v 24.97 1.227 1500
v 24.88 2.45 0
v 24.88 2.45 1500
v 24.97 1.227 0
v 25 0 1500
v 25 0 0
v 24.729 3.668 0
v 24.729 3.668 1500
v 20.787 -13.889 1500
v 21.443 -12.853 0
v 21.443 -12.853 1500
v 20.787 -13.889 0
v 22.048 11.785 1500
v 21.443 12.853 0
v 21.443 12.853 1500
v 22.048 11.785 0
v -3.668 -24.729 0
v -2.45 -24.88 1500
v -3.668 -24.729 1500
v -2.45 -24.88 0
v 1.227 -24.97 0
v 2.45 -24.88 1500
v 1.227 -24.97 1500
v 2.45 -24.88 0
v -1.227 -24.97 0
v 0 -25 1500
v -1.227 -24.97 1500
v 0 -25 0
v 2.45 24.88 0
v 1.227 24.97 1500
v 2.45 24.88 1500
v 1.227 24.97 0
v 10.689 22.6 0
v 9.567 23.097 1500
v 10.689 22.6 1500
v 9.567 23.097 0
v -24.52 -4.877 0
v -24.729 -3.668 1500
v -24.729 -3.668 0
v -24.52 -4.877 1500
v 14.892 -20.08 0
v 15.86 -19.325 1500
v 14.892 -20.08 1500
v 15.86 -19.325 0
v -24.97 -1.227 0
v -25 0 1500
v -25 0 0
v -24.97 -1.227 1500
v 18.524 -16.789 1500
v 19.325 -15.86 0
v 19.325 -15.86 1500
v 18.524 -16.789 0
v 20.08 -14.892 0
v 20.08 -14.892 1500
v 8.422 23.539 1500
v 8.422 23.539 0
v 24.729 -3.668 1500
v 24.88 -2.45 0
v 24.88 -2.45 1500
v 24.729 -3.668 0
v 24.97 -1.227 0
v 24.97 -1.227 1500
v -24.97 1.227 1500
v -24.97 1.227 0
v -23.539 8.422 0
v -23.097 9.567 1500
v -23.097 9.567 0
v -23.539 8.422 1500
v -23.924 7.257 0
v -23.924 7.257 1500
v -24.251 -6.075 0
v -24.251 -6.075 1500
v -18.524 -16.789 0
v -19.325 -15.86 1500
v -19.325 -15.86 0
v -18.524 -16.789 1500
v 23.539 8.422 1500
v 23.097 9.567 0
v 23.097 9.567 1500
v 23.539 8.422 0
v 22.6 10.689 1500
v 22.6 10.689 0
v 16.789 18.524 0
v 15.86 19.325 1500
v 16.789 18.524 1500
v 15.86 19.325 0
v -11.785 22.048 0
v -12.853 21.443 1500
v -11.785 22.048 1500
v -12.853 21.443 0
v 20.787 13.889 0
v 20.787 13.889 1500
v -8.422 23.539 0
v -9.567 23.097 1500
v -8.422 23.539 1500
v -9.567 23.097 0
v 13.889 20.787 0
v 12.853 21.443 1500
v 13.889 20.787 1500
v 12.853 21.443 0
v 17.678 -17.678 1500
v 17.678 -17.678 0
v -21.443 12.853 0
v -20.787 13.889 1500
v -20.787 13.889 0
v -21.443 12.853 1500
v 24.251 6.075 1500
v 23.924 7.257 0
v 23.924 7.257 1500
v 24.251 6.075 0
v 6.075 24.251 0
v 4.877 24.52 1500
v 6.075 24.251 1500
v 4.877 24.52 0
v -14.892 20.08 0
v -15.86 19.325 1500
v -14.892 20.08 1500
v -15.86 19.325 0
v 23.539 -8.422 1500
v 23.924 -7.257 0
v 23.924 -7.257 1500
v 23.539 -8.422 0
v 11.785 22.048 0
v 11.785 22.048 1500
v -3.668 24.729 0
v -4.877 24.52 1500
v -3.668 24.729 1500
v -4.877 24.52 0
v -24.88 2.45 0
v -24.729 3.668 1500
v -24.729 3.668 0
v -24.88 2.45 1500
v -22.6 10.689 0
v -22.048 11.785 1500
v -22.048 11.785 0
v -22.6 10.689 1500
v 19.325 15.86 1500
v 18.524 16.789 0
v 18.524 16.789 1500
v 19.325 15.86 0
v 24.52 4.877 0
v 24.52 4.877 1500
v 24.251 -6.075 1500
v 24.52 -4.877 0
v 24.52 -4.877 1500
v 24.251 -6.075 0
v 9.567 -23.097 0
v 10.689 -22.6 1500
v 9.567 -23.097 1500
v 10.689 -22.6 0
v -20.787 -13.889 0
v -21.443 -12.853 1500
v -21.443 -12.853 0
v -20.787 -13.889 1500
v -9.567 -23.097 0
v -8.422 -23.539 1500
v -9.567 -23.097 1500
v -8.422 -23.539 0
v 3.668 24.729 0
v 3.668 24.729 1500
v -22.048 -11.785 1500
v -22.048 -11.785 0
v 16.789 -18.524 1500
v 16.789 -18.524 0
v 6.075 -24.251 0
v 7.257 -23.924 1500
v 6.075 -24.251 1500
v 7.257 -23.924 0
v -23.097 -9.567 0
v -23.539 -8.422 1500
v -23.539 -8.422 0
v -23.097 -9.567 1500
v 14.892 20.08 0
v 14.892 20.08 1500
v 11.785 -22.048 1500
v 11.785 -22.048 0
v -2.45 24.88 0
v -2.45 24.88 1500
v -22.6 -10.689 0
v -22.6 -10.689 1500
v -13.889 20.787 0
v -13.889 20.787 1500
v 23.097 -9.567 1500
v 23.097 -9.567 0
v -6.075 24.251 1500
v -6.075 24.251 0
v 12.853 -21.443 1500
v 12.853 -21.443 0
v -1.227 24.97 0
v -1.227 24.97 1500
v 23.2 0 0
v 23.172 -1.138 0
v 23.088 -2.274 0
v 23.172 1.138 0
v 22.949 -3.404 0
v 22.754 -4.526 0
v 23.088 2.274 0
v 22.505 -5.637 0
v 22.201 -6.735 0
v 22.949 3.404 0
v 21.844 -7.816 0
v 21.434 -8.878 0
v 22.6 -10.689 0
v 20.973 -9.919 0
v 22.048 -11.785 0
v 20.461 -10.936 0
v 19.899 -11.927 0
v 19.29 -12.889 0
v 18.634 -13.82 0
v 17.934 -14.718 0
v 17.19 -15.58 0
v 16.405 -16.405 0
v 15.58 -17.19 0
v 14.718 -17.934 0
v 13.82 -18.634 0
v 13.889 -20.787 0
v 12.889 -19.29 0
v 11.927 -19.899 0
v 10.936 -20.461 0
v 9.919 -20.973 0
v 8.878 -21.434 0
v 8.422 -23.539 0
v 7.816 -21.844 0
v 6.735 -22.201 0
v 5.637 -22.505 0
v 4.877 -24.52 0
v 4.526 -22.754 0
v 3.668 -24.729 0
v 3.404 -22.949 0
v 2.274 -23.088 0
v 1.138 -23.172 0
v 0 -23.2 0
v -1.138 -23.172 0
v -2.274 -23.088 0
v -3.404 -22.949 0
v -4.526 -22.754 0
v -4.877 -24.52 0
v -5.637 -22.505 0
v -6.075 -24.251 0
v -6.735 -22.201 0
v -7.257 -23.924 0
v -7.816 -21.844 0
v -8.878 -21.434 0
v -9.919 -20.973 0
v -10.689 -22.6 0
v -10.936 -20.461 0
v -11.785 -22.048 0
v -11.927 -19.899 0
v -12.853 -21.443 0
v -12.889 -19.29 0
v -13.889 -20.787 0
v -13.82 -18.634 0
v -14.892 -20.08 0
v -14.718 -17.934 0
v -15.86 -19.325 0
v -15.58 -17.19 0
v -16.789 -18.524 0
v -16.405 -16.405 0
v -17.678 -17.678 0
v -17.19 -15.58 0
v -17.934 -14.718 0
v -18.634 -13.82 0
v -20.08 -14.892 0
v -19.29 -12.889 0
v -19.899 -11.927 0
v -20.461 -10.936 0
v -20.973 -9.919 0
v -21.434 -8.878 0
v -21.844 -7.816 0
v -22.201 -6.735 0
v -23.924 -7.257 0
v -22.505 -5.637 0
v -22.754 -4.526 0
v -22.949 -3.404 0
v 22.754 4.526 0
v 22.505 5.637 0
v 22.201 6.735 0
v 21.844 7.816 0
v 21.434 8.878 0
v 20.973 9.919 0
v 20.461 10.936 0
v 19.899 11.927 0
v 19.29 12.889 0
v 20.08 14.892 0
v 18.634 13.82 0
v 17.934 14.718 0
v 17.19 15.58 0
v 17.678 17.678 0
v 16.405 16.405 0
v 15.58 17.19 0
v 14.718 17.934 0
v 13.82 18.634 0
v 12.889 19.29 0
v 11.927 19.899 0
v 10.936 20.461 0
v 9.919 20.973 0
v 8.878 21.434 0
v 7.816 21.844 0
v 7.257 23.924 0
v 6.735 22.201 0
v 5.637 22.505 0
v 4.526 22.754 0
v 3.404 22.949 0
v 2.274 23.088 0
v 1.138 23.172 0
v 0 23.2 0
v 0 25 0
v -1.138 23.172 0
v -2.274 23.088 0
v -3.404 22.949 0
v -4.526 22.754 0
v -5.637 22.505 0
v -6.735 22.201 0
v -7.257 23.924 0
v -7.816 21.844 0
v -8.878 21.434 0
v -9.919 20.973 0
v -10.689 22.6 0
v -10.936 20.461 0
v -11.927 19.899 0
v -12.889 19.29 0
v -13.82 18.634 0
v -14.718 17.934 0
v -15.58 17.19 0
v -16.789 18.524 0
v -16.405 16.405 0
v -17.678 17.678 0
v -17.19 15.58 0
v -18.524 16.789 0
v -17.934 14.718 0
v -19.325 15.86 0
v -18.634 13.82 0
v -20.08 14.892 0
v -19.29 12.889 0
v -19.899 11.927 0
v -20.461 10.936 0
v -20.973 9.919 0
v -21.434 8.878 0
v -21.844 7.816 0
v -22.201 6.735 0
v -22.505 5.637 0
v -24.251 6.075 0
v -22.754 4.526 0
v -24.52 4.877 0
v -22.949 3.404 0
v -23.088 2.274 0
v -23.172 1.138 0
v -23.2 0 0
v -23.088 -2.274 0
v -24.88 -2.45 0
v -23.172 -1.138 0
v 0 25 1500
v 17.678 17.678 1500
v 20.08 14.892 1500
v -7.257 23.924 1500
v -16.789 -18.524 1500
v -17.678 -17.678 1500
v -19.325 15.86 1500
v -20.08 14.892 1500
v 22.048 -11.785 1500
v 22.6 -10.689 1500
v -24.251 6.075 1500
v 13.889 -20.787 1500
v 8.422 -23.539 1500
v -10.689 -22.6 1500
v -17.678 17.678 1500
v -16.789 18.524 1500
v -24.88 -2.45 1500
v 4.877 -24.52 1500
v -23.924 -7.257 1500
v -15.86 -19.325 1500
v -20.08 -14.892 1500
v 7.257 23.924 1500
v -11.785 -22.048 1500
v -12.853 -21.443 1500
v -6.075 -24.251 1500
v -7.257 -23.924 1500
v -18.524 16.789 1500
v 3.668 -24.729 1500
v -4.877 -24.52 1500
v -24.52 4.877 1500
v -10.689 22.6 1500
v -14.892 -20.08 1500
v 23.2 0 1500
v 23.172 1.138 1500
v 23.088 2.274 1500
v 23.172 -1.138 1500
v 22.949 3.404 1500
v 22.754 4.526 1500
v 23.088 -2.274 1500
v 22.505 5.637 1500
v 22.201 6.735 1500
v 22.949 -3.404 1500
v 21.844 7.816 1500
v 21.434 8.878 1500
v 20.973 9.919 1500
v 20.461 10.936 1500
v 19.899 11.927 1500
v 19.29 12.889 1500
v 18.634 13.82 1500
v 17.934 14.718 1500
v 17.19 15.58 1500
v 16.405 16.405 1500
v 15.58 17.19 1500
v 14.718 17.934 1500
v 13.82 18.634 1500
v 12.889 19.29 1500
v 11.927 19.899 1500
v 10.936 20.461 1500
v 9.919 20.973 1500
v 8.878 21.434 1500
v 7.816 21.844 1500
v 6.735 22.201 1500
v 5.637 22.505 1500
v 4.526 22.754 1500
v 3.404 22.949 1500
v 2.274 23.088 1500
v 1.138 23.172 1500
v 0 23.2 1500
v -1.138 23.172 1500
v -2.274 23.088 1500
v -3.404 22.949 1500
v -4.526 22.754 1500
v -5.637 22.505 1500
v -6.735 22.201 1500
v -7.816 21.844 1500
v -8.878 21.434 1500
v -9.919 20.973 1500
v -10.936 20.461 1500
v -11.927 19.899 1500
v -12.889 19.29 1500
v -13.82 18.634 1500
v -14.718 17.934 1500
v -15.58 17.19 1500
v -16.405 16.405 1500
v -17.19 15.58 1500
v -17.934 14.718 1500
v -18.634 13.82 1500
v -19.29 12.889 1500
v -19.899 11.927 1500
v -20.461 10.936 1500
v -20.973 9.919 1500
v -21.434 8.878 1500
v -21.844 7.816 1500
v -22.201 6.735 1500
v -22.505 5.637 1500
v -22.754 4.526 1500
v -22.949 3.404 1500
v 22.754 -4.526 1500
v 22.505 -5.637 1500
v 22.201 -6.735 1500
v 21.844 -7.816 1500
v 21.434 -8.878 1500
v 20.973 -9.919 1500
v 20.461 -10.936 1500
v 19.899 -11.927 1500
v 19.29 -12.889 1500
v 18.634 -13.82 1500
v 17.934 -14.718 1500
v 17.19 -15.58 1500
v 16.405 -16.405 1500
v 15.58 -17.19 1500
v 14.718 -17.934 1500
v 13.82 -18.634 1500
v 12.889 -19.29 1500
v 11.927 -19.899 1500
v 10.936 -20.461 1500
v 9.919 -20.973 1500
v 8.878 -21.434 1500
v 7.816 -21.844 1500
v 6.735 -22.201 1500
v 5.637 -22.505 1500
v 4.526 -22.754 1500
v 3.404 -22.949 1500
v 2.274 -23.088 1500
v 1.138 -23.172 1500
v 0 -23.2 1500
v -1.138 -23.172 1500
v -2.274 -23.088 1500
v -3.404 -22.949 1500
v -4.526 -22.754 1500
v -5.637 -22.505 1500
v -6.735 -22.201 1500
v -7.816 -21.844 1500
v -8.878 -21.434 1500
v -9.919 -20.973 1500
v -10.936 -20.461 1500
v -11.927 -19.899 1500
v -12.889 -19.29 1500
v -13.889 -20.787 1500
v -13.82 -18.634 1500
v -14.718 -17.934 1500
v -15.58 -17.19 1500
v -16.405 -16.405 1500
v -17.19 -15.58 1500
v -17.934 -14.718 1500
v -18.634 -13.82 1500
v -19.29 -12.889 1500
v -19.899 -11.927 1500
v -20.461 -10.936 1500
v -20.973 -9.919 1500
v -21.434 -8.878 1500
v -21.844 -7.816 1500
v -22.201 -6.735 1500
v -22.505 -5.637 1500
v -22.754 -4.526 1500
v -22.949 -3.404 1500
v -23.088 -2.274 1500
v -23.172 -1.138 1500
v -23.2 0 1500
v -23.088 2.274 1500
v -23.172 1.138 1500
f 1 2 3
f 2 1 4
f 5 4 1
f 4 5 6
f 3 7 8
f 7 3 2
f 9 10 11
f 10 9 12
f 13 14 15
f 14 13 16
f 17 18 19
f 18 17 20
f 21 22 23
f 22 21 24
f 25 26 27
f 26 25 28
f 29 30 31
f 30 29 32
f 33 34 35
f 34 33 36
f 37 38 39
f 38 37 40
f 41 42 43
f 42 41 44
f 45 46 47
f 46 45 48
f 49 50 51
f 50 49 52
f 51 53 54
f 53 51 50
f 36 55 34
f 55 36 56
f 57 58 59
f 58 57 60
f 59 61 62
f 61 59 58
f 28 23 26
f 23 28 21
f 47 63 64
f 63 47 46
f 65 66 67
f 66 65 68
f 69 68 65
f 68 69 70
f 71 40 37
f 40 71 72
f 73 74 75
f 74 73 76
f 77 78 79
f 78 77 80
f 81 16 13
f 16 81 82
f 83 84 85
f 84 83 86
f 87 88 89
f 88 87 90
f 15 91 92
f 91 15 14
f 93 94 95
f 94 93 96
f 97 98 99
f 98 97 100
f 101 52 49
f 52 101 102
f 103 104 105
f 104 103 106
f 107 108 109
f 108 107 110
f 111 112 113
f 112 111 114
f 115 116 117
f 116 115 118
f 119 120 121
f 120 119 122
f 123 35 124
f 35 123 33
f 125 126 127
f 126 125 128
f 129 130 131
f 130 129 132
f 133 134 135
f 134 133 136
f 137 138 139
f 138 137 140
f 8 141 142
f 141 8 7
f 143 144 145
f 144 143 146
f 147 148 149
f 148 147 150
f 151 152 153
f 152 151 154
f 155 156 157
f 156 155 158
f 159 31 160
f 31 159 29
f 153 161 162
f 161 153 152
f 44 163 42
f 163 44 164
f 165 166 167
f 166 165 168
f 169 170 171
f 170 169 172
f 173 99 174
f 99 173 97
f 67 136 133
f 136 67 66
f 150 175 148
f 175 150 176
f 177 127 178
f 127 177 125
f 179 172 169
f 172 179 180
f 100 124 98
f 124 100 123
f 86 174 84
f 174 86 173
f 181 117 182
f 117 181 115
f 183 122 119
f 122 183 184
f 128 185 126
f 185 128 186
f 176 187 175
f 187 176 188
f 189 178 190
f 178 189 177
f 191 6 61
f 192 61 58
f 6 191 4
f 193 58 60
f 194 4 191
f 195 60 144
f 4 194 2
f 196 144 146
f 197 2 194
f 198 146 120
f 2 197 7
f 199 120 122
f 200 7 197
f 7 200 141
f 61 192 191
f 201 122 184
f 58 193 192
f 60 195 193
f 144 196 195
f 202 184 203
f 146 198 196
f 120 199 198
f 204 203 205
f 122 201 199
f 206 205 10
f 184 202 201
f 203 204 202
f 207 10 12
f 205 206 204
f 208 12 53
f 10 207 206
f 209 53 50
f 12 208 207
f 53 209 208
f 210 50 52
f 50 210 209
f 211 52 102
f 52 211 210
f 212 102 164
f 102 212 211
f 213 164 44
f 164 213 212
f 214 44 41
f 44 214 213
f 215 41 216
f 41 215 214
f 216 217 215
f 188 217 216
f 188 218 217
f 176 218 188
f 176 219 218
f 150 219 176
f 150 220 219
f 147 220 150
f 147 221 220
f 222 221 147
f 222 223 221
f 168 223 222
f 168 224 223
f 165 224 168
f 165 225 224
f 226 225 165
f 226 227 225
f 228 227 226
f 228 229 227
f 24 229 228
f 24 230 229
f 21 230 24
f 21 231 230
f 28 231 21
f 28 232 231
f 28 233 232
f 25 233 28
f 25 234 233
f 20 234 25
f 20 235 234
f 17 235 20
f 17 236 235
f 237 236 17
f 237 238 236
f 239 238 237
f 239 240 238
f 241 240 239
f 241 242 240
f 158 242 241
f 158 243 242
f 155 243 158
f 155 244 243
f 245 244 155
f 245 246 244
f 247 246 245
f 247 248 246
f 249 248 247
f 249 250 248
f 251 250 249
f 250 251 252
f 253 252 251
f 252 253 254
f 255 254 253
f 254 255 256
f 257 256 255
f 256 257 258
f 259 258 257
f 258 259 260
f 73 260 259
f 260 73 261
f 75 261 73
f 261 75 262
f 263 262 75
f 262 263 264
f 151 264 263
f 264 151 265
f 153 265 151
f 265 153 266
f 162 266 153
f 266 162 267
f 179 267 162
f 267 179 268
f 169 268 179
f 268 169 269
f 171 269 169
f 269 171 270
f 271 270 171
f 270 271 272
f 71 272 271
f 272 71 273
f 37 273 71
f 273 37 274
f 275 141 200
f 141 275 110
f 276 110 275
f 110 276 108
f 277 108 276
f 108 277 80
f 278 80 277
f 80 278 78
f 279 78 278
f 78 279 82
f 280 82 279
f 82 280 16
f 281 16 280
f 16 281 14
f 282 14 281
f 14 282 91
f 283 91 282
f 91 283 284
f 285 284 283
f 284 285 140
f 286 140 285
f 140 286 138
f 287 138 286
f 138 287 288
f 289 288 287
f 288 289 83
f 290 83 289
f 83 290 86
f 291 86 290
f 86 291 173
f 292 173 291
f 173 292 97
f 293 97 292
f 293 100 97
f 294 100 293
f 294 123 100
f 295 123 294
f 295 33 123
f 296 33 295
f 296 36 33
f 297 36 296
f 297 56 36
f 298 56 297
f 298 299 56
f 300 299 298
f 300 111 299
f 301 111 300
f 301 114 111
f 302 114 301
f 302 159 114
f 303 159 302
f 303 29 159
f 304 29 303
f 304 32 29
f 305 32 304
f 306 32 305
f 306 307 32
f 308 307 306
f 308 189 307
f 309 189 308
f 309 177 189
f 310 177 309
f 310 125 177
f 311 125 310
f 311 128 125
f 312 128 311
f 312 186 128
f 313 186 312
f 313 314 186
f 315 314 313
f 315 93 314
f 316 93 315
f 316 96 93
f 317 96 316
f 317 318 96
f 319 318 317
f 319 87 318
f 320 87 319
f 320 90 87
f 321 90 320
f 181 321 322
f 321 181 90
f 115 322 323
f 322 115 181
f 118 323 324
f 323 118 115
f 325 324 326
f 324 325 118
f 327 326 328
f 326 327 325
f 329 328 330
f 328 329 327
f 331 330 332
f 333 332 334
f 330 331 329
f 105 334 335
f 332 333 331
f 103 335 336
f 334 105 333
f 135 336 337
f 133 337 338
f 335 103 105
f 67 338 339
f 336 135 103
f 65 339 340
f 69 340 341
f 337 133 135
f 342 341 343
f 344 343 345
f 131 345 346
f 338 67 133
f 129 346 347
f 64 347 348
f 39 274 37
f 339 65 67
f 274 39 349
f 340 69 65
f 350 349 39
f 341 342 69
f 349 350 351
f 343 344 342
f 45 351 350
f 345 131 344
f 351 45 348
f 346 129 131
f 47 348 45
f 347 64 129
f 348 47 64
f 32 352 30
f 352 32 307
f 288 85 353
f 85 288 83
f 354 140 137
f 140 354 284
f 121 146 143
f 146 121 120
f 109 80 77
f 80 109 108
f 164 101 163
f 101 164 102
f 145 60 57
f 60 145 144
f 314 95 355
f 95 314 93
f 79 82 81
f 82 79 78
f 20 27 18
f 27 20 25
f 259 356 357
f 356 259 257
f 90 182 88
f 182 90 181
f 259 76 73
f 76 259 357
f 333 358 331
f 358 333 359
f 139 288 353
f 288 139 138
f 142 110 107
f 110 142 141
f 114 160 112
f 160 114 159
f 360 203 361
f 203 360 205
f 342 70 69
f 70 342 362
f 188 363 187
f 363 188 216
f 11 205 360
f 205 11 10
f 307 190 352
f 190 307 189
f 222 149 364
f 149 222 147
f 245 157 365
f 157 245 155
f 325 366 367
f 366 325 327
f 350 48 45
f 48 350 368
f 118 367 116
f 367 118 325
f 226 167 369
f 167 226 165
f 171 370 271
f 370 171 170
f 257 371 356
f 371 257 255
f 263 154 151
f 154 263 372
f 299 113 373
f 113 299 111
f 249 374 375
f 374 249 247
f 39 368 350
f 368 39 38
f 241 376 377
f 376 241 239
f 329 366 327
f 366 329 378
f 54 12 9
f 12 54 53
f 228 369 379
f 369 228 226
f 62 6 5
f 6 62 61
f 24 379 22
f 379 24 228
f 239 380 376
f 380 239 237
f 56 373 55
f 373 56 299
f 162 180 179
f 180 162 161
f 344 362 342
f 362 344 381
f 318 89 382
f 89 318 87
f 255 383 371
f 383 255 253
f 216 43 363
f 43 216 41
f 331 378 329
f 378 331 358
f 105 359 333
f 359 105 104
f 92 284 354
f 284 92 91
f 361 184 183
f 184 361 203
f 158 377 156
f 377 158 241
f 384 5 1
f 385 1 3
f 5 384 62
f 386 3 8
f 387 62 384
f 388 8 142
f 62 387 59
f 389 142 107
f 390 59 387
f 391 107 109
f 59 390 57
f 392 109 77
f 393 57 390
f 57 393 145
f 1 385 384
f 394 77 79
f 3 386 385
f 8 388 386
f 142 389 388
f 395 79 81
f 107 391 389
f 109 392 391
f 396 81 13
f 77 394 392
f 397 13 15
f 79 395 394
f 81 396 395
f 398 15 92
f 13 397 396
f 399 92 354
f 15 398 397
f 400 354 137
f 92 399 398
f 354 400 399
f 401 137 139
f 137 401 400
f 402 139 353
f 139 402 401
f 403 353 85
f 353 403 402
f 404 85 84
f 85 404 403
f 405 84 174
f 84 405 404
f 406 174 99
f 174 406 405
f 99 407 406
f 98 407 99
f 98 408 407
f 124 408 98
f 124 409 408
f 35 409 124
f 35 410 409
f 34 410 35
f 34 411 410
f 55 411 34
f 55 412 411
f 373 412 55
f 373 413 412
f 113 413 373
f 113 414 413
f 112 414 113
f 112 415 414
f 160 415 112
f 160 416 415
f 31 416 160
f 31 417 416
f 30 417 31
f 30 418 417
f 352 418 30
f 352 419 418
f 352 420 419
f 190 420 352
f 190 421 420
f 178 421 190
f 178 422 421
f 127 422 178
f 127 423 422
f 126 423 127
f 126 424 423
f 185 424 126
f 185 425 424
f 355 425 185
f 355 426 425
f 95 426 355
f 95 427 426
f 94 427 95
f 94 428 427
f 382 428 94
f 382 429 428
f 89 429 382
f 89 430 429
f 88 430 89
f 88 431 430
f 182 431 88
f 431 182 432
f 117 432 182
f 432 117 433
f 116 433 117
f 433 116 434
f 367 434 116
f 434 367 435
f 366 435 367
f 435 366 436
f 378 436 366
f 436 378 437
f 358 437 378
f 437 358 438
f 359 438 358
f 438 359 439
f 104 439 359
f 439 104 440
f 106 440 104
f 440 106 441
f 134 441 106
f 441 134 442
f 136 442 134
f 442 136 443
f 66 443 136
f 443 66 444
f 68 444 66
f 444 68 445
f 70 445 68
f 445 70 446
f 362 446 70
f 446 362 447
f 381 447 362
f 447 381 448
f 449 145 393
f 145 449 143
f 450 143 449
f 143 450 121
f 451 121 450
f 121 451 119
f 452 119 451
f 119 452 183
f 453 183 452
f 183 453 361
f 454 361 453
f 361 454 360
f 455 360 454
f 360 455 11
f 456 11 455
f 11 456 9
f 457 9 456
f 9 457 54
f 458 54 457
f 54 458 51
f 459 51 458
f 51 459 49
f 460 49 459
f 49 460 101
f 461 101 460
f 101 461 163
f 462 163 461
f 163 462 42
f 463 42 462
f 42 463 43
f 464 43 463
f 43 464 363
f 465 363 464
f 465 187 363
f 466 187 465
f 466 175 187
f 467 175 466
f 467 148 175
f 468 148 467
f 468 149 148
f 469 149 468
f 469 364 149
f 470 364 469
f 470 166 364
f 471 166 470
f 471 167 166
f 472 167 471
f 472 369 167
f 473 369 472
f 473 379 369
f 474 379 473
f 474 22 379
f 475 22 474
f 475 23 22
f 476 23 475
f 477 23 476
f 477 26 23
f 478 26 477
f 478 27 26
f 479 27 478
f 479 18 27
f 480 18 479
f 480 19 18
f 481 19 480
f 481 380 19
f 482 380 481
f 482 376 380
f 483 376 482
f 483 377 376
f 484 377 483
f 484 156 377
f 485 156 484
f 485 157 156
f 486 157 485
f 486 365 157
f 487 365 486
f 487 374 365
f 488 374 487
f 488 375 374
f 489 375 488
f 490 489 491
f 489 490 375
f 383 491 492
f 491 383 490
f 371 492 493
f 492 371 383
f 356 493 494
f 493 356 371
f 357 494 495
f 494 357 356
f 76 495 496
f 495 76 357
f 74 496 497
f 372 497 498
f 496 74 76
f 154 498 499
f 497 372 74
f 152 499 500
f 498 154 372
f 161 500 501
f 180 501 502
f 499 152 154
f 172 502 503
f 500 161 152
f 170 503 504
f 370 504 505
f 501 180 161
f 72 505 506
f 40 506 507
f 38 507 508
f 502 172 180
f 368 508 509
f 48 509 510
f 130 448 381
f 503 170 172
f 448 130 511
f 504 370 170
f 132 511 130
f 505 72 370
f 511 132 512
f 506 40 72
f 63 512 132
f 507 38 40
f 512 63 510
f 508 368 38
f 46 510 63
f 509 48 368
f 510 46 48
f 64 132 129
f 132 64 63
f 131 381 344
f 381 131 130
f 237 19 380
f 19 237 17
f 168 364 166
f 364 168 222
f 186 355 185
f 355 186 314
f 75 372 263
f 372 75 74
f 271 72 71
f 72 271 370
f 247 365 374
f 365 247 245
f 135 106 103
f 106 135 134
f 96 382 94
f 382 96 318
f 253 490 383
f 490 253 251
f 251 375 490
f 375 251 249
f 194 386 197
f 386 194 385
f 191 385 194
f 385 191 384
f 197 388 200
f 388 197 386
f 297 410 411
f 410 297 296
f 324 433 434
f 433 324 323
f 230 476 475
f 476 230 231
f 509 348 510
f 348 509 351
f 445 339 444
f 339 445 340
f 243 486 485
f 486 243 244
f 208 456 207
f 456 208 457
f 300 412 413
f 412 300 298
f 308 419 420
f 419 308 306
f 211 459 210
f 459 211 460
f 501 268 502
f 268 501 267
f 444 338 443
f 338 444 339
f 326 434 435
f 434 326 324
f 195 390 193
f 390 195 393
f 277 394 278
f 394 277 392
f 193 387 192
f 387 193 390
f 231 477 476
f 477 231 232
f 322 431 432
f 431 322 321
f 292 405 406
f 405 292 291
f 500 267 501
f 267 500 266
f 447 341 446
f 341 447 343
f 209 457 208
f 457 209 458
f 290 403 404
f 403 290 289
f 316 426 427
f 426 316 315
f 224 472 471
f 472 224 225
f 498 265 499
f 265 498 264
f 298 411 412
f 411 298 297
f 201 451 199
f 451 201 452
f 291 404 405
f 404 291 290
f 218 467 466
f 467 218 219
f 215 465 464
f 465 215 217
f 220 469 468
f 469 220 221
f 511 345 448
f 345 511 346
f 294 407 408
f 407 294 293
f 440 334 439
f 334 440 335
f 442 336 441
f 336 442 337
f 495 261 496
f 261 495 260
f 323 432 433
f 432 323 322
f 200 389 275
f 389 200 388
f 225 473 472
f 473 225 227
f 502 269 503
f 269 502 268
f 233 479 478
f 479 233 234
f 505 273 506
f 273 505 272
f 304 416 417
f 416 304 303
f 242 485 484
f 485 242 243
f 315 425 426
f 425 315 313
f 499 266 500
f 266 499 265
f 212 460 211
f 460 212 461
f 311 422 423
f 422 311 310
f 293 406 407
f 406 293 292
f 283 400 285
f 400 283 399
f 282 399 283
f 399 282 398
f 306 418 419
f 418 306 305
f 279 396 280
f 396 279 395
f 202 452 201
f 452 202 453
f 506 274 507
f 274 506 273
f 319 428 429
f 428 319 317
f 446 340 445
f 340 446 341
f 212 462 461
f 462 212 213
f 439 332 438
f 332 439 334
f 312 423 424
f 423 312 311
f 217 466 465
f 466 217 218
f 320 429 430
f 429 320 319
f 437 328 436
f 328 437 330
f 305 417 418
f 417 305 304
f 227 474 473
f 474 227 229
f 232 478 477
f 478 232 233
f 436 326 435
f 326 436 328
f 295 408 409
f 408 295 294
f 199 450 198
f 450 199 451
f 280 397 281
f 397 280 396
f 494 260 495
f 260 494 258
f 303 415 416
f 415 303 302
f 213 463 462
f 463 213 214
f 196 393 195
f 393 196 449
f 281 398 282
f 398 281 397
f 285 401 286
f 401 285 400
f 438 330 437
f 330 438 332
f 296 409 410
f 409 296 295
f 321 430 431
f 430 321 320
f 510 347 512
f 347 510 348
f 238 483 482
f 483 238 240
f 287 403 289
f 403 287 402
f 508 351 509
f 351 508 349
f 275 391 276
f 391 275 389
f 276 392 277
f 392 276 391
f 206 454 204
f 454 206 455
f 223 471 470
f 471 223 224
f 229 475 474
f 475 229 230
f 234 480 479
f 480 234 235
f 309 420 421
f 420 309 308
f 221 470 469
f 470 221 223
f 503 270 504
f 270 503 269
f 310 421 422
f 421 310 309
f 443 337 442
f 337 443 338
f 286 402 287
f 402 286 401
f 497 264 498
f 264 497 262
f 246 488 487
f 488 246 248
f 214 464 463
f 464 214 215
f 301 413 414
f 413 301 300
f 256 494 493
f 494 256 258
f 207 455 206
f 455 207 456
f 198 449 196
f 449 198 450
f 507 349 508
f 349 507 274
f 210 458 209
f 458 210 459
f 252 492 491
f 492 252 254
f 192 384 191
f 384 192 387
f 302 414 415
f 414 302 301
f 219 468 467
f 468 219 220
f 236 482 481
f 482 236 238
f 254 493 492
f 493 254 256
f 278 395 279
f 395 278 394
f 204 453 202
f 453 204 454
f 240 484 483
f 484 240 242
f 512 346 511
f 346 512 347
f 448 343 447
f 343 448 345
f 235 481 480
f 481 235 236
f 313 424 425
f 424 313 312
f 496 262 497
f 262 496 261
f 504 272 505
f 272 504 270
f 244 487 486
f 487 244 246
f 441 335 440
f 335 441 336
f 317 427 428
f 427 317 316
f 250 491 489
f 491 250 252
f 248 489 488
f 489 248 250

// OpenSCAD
$fn = 128;

// HT 50 pipe (approx.): OD 50 mm, wall 1.8 mm, length 1500 mm
od = 50;
wall = 1.8;
id = od - 2*wall;
len = 1500;

module pipe(od, id, len) {
    difference() {
        cylinder(h = len, d = od);
        translate([0,0,-0.1]) cylinder(h = len + 0.2, d = id);
    }
}

pipe(od, id, len);
